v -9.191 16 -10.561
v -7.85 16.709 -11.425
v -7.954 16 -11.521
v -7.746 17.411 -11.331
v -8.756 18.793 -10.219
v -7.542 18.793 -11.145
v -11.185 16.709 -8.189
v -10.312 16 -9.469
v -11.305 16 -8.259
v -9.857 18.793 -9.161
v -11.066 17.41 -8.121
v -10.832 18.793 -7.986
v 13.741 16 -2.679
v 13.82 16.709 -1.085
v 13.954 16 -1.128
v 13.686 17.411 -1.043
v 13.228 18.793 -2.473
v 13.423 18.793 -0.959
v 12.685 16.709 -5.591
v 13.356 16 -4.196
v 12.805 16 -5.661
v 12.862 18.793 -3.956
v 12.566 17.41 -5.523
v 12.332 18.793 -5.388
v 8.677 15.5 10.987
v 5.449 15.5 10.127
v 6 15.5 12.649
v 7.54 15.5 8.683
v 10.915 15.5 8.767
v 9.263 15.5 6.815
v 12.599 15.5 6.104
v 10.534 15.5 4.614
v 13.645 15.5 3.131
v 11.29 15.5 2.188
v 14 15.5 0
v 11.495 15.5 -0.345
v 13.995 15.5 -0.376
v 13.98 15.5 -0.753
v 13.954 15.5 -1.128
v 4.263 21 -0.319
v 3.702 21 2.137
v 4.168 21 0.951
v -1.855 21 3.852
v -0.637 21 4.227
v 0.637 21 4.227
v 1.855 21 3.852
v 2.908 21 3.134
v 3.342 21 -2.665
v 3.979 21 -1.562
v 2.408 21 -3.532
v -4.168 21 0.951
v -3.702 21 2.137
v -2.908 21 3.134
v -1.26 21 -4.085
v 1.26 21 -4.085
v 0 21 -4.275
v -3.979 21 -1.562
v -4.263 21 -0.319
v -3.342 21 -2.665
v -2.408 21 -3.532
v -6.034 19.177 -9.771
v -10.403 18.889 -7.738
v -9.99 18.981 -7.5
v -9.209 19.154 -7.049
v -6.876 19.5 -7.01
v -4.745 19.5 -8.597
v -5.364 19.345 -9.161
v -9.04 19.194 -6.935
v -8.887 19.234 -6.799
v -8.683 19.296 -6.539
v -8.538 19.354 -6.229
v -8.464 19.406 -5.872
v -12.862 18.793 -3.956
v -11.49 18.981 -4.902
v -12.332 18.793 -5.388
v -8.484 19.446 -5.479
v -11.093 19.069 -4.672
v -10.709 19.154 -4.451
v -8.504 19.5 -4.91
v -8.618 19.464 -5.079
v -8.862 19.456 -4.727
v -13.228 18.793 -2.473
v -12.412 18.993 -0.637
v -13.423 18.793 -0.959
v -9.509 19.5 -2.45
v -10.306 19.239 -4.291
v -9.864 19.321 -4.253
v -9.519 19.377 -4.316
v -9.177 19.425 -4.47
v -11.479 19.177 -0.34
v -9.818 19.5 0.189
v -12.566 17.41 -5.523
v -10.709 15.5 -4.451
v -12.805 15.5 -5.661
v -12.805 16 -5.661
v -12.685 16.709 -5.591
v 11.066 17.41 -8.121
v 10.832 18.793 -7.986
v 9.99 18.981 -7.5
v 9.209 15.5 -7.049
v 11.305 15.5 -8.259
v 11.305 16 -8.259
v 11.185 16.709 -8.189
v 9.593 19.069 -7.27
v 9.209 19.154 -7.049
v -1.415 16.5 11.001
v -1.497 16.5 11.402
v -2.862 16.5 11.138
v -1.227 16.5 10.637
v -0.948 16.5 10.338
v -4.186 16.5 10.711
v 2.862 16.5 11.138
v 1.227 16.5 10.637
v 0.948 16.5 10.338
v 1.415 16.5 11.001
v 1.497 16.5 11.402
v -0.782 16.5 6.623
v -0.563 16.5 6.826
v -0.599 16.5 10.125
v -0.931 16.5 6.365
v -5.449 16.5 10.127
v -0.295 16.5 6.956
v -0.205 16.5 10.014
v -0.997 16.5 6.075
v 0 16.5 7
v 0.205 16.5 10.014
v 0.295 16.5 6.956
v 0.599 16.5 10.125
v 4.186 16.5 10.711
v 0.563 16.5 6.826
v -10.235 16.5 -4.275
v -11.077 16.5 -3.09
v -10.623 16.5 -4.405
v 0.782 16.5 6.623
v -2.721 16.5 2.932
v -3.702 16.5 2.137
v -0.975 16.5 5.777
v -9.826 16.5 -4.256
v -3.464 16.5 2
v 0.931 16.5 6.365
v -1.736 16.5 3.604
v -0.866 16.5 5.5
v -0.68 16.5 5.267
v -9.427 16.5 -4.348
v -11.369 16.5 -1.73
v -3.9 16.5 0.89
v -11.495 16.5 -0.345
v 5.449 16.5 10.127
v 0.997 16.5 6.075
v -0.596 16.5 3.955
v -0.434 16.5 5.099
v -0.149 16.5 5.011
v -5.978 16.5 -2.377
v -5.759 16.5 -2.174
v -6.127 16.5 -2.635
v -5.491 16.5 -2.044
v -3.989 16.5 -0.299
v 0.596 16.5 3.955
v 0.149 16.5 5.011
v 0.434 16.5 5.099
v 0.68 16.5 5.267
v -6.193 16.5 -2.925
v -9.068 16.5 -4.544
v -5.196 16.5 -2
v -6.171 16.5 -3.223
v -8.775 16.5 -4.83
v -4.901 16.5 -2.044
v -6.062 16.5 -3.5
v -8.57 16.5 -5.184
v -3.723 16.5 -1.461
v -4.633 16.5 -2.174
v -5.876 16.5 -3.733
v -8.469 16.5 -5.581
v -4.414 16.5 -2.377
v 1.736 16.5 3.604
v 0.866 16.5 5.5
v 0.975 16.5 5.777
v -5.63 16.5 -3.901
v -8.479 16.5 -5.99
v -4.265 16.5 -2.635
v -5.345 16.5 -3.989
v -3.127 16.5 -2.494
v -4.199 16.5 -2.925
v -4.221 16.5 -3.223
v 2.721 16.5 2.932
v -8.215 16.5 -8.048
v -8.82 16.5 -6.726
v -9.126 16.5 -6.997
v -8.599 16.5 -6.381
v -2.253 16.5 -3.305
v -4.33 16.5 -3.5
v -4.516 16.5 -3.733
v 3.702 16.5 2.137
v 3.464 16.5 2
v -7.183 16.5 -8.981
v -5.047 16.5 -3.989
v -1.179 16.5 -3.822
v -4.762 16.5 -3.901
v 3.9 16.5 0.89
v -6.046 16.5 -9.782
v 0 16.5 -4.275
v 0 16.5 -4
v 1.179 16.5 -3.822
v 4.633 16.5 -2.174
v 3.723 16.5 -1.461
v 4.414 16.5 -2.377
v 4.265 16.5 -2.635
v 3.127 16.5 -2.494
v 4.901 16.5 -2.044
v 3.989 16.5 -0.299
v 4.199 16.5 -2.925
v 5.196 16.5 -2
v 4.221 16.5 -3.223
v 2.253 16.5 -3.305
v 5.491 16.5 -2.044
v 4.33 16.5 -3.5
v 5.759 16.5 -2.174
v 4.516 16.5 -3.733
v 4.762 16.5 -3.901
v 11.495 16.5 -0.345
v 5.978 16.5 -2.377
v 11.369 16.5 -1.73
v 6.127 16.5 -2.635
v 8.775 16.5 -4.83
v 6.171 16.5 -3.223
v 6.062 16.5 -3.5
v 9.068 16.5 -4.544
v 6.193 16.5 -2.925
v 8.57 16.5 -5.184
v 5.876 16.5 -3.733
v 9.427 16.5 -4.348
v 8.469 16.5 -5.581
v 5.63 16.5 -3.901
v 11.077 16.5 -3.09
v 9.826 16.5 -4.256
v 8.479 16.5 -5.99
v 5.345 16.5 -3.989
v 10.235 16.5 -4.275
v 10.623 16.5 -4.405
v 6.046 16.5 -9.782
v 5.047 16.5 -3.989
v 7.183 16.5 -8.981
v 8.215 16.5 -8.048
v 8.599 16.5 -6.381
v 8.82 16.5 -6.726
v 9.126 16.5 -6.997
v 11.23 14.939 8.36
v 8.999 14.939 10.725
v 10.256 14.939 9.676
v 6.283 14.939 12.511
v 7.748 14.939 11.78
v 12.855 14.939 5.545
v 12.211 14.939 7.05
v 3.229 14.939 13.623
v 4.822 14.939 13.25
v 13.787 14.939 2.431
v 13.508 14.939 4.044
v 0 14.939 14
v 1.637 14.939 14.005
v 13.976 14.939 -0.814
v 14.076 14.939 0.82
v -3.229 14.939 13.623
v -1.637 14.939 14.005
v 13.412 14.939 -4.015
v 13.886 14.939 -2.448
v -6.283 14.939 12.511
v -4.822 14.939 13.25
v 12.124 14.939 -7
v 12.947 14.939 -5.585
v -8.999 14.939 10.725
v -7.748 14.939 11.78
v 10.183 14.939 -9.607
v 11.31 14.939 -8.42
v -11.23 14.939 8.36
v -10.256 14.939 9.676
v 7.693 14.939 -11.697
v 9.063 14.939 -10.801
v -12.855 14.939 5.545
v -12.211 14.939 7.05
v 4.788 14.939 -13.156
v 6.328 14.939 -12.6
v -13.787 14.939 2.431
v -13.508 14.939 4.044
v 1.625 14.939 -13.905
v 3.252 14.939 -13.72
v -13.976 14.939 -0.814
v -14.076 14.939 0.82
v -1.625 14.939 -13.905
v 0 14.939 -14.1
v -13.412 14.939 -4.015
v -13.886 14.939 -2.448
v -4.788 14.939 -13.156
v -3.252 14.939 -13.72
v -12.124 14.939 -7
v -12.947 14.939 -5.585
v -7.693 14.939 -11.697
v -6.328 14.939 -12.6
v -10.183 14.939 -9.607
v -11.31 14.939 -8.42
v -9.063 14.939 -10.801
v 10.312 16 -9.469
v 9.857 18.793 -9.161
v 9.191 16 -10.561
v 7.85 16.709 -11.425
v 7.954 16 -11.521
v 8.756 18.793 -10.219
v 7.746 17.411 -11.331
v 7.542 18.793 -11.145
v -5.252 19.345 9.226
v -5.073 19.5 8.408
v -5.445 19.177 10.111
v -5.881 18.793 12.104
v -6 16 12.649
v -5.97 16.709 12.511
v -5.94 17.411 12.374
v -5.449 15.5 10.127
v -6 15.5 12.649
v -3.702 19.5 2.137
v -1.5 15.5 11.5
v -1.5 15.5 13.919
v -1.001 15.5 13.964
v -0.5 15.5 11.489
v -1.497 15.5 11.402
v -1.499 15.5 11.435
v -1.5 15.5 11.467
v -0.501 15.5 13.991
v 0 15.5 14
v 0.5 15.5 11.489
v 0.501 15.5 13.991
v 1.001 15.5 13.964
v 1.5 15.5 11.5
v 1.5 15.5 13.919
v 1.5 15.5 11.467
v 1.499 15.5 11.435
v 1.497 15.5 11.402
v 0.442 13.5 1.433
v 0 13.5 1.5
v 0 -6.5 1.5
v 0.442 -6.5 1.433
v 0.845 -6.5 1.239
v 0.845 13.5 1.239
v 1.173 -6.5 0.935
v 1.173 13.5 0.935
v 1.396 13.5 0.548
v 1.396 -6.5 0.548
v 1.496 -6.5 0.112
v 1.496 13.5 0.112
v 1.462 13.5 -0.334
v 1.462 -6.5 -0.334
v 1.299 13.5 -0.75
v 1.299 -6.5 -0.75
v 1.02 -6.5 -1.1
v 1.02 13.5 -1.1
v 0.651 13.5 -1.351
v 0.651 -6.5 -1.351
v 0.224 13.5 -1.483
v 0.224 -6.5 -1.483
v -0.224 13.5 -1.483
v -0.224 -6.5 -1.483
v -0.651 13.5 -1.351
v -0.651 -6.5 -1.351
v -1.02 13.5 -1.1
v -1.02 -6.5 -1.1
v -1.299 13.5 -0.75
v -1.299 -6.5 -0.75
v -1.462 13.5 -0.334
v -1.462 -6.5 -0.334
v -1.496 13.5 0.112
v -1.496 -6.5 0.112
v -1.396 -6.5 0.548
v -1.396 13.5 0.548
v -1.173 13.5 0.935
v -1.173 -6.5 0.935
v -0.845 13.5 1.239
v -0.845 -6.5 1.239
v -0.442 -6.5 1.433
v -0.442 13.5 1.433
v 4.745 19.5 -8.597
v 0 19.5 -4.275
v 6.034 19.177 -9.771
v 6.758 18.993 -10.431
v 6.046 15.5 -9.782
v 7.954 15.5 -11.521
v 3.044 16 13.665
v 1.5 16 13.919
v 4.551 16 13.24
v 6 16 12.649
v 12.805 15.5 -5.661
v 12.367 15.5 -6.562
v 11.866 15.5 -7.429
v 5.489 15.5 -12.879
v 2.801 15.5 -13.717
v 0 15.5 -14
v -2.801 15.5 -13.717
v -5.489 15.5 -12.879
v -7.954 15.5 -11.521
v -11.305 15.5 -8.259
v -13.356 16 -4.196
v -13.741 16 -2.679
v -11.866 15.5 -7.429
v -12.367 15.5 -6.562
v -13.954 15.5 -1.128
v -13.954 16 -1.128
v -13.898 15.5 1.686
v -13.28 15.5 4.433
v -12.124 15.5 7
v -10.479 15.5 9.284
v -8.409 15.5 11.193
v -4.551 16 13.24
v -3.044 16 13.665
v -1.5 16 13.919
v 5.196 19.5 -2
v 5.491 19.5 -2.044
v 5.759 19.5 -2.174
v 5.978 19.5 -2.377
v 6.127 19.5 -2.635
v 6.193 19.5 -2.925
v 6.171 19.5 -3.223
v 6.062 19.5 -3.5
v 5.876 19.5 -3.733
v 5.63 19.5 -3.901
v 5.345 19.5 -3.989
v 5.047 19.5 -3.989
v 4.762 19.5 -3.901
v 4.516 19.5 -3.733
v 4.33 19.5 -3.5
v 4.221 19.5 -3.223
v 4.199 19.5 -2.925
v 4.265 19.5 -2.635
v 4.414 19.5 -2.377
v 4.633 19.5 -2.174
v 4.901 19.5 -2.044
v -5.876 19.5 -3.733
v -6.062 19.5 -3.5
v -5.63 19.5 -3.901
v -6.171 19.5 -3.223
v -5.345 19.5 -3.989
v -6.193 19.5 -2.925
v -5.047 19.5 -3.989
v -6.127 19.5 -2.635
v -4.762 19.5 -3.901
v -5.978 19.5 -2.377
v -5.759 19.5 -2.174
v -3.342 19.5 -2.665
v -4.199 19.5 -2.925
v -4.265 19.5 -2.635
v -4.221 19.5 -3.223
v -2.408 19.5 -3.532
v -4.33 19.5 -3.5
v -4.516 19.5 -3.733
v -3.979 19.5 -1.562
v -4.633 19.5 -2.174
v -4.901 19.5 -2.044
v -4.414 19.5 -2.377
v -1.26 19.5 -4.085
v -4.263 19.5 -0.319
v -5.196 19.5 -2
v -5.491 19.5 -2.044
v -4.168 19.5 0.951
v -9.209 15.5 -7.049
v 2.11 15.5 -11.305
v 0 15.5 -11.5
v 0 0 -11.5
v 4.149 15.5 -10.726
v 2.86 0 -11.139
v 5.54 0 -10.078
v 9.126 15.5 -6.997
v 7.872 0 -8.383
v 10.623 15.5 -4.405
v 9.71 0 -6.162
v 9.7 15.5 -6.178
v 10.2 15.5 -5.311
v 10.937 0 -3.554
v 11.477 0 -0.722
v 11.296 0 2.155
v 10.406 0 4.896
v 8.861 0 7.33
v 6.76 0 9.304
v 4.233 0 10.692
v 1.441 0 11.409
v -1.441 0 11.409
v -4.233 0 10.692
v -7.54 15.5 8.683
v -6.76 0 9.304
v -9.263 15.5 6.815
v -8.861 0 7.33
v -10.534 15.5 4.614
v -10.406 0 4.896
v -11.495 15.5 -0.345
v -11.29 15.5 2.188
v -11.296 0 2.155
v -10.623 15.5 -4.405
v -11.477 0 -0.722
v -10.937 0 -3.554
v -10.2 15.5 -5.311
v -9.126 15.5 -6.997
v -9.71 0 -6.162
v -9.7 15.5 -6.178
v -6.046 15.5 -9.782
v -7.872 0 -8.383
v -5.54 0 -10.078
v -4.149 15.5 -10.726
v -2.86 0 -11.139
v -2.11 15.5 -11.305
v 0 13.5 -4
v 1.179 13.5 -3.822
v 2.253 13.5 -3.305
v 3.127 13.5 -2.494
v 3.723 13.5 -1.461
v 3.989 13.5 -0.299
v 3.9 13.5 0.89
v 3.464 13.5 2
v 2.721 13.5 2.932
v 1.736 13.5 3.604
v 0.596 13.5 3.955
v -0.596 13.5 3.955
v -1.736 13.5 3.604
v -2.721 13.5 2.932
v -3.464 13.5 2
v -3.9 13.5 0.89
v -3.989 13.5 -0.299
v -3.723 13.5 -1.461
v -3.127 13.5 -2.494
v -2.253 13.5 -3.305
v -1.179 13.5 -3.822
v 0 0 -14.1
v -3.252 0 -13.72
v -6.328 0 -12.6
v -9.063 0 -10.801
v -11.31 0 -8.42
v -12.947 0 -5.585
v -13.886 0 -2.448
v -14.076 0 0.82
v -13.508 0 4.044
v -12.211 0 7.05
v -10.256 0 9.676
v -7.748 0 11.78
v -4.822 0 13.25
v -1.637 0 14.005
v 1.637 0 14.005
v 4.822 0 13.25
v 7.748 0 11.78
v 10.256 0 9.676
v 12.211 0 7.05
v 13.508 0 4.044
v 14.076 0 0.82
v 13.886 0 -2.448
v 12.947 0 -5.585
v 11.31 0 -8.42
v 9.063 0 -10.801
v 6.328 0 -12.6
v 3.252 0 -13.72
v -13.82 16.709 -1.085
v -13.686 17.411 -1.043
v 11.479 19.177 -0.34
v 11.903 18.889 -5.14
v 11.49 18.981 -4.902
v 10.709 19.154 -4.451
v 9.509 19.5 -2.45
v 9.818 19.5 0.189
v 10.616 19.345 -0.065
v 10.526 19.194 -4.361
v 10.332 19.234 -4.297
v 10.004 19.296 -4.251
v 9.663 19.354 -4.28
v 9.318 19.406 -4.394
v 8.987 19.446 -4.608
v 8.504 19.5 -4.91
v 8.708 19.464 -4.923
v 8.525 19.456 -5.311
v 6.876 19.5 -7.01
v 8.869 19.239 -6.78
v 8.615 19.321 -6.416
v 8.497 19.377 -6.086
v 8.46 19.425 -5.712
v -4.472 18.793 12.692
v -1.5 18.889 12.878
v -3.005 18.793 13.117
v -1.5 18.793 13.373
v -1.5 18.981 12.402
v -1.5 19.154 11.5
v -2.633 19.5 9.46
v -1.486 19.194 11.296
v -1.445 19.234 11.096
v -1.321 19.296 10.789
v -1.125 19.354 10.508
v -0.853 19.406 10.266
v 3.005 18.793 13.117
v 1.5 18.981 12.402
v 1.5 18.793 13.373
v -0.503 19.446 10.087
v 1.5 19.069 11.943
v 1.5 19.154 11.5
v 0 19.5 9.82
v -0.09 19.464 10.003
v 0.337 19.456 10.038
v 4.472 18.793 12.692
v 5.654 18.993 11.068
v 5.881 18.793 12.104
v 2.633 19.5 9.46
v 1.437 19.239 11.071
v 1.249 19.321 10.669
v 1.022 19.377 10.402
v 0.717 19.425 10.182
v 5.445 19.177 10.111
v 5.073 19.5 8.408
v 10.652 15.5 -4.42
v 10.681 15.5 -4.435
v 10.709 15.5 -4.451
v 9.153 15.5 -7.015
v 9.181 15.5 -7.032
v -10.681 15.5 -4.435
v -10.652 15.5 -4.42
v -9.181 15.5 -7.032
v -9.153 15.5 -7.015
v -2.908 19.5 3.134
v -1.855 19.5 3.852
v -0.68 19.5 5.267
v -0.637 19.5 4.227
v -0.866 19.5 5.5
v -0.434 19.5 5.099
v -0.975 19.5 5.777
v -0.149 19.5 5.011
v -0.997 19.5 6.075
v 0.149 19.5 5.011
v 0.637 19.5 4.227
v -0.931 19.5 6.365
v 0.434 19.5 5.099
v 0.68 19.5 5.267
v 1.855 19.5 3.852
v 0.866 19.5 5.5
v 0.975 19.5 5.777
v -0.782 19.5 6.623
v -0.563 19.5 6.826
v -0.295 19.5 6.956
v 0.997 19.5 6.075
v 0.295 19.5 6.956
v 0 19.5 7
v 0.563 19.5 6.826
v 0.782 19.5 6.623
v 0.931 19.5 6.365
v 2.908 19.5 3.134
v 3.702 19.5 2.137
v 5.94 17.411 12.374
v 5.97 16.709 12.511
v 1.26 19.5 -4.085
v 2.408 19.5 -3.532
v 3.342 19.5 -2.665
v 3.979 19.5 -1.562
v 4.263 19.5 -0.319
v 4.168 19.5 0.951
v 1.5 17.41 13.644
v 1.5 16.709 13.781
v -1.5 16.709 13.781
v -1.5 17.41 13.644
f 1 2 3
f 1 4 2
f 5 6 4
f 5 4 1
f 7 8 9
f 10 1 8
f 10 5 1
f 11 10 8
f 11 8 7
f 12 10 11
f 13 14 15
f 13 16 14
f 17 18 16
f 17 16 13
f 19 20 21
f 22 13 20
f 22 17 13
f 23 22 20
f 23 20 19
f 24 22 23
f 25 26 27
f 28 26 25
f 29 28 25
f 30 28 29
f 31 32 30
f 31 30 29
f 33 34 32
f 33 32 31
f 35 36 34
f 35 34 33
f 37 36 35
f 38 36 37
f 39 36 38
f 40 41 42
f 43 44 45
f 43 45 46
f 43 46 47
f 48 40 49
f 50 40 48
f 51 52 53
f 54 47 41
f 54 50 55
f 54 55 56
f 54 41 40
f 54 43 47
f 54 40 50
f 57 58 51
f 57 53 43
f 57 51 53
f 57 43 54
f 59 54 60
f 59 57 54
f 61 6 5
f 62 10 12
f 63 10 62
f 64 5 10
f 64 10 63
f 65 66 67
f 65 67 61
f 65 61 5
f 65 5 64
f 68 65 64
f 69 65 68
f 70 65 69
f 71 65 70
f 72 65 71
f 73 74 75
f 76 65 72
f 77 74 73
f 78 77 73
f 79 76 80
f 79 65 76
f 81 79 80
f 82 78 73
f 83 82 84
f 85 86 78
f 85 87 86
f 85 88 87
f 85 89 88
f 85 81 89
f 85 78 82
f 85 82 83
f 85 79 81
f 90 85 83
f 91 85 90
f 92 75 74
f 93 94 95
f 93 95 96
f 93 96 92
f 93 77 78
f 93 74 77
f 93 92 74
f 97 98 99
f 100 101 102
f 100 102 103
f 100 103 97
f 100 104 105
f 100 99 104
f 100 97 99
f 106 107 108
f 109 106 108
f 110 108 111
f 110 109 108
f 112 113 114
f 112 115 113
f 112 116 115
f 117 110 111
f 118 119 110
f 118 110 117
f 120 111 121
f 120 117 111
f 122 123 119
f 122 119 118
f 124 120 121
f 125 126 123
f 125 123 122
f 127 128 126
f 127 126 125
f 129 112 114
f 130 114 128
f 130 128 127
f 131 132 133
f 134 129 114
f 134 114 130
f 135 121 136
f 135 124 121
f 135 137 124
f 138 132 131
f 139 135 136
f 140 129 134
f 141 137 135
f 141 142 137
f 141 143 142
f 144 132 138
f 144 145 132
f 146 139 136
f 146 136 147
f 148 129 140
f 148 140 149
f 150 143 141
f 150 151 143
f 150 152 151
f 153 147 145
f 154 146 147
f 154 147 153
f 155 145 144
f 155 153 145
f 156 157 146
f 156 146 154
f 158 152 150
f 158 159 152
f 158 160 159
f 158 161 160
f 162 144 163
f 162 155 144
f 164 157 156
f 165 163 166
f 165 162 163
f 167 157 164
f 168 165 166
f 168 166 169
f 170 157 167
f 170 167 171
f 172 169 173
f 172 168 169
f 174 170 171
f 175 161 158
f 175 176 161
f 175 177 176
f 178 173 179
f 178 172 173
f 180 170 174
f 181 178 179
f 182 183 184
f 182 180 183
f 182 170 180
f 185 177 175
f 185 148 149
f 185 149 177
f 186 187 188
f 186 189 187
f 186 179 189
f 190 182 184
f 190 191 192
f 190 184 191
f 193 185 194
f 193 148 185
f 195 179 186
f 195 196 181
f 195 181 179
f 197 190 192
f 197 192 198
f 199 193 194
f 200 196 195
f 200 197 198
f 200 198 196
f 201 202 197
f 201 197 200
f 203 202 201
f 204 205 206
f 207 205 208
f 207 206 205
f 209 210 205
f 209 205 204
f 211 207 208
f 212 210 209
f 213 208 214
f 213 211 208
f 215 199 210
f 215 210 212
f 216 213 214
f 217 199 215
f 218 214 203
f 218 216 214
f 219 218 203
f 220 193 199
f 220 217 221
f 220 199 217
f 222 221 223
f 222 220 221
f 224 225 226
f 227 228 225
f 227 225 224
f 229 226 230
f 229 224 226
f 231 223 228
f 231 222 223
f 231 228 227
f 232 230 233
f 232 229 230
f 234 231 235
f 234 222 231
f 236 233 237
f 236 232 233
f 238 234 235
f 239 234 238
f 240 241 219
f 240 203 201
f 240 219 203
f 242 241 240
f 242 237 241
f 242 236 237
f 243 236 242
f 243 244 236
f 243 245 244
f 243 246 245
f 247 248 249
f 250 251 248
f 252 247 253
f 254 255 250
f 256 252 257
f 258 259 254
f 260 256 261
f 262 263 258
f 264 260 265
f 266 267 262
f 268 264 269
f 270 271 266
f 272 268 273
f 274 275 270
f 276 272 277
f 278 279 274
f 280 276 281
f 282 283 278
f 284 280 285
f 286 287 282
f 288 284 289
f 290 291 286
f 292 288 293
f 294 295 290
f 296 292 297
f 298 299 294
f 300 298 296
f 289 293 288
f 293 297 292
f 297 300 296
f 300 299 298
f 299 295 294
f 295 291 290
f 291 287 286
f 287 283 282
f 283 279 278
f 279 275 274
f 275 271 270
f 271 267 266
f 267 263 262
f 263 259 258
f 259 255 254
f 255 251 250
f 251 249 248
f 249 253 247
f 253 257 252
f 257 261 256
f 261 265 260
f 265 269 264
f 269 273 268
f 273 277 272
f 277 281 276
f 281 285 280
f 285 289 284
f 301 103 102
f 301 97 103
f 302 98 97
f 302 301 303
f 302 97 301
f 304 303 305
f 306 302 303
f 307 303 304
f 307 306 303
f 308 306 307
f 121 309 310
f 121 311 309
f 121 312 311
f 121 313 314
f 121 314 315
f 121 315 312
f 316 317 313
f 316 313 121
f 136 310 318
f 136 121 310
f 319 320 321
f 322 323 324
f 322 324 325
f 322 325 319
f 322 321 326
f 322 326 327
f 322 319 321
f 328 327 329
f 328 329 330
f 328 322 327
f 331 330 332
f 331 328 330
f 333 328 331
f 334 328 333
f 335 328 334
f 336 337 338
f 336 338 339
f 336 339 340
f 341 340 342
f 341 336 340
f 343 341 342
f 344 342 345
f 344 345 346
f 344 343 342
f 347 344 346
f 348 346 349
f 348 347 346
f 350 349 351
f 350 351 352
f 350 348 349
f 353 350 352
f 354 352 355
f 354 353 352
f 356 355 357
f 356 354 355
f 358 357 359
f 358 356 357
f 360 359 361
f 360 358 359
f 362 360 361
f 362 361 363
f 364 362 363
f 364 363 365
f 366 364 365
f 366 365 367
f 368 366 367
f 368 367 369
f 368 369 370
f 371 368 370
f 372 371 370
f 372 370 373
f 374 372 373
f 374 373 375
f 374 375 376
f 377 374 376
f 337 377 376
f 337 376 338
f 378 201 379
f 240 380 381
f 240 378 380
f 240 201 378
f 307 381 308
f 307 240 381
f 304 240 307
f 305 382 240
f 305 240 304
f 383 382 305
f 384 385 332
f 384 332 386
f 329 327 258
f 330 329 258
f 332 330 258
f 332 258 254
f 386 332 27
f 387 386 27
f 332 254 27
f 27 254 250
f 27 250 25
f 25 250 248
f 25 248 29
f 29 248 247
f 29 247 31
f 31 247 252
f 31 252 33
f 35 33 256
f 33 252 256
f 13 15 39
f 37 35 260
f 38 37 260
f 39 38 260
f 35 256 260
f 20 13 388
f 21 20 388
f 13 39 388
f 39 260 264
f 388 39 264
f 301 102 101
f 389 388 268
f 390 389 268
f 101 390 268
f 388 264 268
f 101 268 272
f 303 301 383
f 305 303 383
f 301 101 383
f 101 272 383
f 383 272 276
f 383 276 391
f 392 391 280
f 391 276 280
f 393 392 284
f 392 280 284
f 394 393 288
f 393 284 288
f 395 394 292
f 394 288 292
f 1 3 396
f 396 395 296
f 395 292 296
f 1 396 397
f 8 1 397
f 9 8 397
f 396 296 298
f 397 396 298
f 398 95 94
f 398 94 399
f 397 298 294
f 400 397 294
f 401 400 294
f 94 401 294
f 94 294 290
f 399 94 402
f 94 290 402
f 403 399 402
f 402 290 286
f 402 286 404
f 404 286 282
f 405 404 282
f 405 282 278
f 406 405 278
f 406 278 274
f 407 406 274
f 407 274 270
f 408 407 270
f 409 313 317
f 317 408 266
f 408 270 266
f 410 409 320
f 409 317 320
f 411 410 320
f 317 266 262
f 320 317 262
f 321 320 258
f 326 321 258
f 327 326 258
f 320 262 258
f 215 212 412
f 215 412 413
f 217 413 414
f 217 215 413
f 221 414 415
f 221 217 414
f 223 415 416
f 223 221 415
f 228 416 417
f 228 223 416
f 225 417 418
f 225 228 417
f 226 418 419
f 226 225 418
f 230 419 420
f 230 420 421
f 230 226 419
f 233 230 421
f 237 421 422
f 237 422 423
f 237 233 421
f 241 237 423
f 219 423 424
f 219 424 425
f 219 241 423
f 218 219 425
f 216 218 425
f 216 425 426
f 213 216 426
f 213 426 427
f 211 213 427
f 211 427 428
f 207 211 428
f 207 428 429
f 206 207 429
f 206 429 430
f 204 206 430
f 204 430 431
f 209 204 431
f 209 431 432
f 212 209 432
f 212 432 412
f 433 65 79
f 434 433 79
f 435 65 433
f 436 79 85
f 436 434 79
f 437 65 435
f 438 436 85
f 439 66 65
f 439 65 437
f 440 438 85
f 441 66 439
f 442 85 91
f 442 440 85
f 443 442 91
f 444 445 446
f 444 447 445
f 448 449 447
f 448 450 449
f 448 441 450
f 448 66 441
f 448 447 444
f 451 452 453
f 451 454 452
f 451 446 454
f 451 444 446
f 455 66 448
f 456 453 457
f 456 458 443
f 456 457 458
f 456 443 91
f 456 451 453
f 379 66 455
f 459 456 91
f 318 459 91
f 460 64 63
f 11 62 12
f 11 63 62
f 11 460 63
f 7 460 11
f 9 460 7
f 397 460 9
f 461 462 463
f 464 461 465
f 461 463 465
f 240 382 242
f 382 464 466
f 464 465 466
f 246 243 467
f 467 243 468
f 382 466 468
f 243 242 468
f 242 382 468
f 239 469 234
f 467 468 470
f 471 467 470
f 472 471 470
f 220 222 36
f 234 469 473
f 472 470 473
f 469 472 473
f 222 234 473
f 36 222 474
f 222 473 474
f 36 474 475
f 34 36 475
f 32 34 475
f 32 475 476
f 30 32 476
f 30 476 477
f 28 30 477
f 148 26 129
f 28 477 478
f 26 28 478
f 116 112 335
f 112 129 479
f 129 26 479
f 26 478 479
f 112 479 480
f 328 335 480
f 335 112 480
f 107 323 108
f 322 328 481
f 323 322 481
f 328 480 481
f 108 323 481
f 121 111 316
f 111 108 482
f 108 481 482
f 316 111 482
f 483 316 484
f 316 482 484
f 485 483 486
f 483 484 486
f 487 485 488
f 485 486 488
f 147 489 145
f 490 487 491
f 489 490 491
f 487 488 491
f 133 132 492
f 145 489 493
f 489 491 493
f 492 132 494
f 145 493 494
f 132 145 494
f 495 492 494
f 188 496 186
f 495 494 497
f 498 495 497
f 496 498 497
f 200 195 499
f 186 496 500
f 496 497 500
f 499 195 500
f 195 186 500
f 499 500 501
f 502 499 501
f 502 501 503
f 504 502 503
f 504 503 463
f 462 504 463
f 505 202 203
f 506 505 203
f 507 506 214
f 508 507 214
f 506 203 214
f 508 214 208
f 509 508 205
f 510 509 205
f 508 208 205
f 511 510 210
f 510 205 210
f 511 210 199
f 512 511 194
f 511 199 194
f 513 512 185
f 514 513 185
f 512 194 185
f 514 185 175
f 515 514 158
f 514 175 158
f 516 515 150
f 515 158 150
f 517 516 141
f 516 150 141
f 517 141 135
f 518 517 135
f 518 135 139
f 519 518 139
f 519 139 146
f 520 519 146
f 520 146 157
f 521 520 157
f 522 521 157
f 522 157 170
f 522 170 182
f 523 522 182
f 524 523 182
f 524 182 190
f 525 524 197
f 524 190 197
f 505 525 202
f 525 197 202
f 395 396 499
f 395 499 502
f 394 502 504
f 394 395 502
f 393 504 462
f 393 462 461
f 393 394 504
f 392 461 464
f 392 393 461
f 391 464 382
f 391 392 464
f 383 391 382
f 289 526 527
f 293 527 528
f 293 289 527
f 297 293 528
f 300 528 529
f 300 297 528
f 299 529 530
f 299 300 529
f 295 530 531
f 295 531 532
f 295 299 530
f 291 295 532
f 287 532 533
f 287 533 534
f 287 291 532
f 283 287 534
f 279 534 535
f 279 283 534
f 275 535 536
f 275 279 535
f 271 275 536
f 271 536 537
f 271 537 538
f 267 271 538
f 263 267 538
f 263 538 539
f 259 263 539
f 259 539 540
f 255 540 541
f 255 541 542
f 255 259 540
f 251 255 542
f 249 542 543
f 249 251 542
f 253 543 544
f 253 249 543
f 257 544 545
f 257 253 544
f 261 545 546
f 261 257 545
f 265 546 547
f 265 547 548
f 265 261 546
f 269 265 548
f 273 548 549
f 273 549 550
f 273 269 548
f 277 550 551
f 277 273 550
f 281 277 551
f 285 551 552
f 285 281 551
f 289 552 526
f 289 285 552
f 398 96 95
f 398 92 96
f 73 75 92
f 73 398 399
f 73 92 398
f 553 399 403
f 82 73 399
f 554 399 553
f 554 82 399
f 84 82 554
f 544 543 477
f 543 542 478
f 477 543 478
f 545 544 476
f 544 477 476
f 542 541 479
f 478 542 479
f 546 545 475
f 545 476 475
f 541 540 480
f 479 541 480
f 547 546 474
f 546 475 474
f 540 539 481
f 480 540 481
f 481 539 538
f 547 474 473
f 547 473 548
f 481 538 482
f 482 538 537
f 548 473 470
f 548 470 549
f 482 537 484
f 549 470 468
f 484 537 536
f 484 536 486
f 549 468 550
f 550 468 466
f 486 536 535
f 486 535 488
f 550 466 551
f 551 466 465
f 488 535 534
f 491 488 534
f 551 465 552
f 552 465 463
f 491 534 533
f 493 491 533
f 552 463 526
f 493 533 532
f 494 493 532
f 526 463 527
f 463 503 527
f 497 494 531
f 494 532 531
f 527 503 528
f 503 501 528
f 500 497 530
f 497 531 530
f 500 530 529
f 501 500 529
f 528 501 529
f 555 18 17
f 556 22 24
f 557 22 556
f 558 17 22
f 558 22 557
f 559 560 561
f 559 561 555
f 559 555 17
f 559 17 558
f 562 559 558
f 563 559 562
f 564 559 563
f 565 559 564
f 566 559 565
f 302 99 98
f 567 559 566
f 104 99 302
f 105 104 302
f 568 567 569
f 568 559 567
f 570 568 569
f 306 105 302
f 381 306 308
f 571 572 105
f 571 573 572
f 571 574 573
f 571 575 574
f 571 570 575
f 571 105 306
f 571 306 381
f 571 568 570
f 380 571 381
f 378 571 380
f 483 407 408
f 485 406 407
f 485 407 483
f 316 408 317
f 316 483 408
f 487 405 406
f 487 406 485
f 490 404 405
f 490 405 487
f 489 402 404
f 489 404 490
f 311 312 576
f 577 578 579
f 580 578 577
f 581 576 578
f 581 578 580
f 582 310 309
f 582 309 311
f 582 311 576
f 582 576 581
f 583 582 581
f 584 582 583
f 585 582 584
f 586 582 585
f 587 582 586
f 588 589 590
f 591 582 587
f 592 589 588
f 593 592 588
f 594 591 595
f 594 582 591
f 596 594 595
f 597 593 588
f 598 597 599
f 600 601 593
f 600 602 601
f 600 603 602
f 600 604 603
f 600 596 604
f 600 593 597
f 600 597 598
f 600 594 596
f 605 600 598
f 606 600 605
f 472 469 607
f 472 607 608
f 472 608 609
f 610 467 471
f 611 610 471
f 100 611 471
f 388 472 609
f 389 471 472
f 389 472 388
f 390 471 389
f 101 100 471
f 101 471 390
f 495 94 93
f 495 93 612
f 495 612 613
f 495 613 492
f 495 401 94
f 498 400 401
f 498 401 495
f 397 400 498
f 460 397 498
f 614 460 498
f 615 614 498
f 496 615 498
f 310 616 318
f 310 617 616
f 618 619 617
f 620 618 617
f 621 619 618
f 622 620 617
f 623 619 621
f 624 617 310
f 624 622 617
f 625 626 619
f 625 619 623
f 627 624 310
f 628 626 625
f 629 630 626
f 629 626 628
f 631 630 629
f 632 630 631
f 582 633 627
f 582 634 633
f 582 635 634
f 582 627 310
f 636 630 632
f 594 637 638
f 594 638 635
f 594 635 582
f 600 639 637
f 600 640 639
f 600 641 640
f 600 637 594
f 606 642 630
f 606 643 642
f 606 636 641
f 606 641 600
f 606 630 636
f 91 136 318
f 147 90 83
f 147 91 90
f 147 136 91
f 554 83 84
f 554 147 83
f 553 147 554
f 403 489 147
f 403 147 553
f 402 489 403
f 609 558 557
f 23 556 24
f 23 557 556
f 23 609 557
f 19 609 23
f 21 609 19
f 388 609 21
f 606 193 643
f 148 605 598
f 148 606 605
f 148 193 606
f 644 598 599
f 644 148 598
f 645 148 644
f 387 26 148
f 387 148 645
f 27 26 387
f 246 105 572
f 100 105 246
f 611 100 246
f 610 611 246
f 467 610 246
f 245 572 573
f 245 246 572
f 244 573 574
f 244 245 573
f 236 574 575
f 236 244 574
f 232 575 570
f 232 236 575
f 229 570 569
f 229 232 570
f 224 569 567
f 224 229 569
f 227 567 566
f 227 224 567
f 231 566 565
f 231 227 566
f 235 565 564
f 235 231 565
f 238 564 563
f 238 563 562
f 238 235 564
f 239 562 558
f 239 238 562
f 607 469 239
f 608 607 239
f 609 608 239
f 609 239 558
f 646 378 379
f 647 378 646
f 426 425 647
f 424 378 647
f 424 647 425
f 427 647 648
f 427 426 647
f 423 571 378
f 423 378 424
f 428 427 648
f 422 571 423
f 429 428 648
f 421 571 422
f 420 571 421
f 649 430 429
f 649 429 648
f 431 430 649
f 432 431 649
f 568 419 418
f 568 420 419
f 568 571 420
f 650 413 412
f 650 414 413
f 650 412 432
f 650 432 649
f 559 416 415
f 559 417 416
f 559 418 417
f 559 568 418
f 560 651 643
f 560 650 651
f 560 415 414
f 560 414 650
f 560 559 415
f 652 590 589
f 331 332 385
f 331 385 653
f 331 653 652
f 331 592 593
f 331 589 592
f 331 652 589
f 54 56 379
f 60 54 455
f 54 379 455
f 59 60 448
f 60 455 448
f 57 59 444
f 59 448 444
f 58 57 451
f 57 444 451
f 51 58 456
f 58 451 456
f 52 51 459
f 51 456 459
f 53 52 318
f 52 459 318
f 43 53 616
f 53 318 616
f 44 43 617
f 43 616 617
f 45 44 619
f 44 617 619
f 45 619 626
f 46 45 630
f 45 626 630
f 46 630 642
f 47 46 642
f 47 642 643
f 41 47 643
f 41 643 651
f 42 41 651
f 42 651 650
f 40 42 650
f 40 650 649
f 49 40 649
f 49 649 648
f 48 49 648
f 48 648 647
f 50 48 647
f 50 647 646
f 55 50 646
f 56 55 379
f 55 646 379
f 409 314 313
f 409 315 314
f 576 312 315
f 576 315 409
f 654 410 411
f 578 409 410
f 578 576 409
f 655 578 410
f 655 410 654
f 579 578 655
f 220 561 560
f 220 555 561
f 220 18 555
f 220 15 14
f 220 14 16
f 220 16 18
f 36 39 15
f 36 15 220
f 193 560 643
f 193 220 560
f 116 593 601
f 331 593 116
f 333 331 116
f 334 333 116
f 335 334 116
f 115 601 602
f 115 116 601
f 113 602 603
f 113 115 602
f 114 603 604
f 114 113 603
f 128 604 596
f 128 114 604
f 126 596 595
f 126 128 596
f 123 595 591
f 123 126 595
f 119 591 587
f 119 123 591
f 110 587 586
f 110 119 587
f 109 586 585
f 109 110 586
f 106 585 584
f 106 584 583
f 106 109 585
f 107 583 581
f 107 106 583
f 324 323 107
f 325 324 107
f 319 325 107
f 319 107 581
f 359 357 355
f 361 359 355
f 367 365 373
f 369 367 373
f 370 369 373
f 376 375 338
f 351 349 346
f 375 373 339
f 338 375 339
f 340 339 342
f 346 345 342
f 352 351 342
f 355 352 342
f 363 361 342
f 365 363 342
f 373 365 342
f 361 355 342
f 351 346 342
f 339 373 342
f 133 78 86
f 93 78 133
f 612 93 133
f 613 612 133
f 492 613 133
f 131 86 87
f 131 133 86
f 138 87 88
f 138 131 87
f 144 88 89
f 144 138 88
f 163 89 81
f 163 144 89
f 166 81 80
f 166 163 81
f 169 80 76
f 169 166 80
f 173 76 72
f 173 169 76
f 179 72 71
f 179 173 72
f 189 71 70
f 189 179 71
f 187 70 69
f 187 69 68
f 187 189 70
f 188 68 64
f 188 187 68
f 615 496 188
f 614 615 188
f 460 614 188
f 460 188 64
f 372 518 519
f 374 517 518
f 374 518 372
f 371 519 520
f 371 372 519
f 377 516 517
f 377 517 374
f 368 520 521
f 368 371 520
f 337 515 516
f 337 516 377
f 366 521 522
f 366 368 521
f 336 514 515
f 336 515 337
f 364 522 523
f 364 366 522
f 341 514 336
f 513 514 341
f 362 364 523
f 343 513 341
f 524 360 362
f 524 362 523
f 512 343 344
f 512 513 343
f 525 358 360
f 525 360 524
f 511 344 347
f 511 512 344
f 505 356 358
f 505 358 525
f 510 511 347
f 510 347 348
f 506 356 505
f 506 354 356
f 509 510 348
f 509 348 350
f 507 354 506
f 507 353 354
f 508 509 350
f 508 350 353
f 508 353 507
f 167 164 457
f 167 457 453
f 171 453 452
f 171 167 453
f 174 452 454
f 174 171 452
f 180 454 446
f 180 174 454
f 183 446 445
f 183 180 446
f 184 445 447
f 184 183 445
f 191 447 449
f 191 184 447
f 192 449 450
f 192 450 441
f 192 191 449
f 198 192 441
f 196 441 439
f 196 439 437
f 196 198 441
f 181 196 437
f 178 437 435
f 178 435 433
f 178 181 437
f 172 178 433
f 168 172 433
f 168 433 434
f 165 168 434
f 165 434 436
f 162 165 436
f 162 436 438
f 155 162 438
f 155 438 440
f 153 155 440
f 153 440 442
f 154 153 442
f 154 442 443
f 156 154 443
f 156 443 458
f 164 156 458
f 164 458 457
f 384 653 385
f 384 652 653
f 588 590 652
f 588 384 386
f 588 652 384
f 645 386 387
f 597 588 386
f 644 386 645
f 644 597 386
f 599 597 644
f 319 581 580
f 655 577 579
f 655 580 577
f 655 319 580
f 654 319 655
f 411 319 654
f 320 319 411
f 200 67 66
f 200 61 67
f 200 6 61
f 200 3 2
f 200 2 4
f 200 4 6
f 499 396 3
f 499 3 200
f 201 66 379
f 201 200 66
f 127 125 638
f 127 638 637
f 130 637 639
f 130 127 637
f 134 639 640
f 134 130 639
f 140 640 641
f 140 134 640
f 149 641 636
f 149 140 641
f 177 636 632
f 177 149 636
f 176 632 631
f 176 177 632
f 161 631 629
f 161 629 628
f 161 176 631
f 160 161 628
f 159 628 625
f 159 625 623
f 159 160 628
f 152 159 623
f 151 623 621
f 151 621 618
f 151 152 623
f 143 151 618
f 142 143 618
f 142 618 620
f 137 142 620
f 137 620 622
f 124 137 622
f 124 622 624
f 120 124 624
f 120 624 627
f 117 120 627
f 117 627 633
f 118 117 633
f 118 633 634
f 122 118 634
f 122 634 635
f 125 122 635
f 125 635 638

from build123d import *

# Parameters (mm, degrees)
SCHIZZO1_R                   = 14
ESTRUSIONE_ESTRUSIONE1_DEPTH = 19.5
TAGLIO_ESTRUSIONE1_START     = -4
SCHIZZO2_R                   = 1
TAGLIO_ESTRUSIONE1_DEPTH     = 4
SCHIZZO3_R                   = 4.27486225
ESTRUSIONE_ESTRUSIONE2_DEPTH = 1.5
SCHIZZO4_R                   = 11.5
TAGLIO_ESTRUSIONE2_DEPTH     = 16.5
SCHIZZO5_R                   = 1.5
TAGLIO_ESTRUSIONE3_DEPTH     = 16.5
TAGLIO_ESTRUSIONE4_START     = -4
TAGLIO_ESTRUSIONE4_DEPTH     = 4
SCHIZZO7_R                   = 1.5
ESTRUSIONE_ESTRUSIONE3_DEPTH = 27.5
SCHIZZO8_R                   = 4
ESTRUSIONE_ESTRUSIONE4_DEPTH = 3
SCHIZZO9_W                   = 0.1
SCHIZZO9_H                   = 14.938811625
SMUSSO1_SIZE                 = 3.5
SMUSSO1_SIZE2                = 0.680331082
SMUSSO2_SIZE                 = 0.720279458
SMUSSO2_SIZE_2               = 3.5


with BuildPart() as part:
    # Schizzo1 → Estrusione-Estrusione1 (new body)
    with BuildSketch(Plane(origin=(0, 0, 0), x_dir=(1, 0, 0), z_dir=(0, 1, 0))):
        with Locations(Location((0, 0, 0), (0, 0, 270))):
            Circle(SCHIZZO1_R)
    extrude(amount=ESTRUSIONE_ESTRUSIONE1_DEPTH)

    # Schizzo2 → Taglio-Estrusione1 (cut)
    with BuildSketch(Plane(origin=(0, 19.5, 0), x_dir=(1, 0, 0), z_dir=(0, 1, 0)).offset(TAGLIO_ESTRUSIONE1_START)):
        with BuildLine():
            Line((-7.95445115, 11.520707743), (0, 4.27486225))
            Line((0, 4.27486225), (7.95445115, 11.520707743))
            ThreePointArc((7.95445115, 11.520707743), (0, 14), (-7.95445115, 11.520707743))
        make_face()
        with BuildLine():
            ThreePointArc((14, 0), (13.988608153, 0.564660915), (13.95445115, 1.128402898))
            Line((13.95445115, 1.128402898), (3.702139306, -2.137431125))
            Line((3.702139306, -2.137431125), (6, -12.649110641))
            ThreePointArc((6, -12.649110641), (11.832159566, -7.483314774), (14, 0))
        make_face()
        with BuildLine():
            Line((-3.702139306, -2.137431125), (-13.95445115, 1.128402898))
            ThreePointArc((-13.95445115, 1.128402898), (-12.124355653, -7), (-6, -12.649110641))
            Line((-6, -12.649110641), (-3.702139306, -2.137431125))
        make_face()
        with Locations(Location((0, -6, 0), (0, 0, 270))):
            Circle(SCHIZZO2_R)
        with Locations(Location((-5.196152423, 3, 0), (0, 0, 270))):
            Circle(SCHIZZO2_R)
        with Locations(Location((5.196152423, 3, 0), (0, 0, 270))):
            Circle(SCHIZZO2_R)
    extrude(amount=TAGLIO_ESTRUSIONE1_DEPTH, mode=Mode.SUBTRACT)

    # Schizzo3 → Estrusione-Estrusione2 (add)
    with BuildSketch(Plane(origin=(0, 19.5, 0), x_dir=(1, 0, 0), z_dir=(0, 1, 0))):
        with Locations(Location((0, 0, 0), (0, 0, 90))):
            Circle(SCHIZZO3_R)
    extrude(amount=ESTRUSIONE_ESTRUSIONE2_DEPTH)

    # Schizzo4 → Taglio-Estrusione2 (cut)
    with BuildSketch(Plane.XZ):
        with Locations(Location((0, 0, 0), (0, 0, 270))):
            Circle(SCHIZZO4_R)
    extrude(amount=-TAGLIO_ESTRUSIONE2_DEPTH, mode=Mode.SUBTRACT)

    # Schizzo5 → Taglio-Estrusione3 (cut)
    with BuildSketch(Plane(origin=(0, 21, 0), x_dir=(1, 0, 0), z_dir=(0, 1, 0))):
        with Locations(Location((0, 0, 0), (0, 0, 270))):
            Circle(SCHIZZO5_R)
    extrude(amount=-TAGLIO_ESTRUSIONE3_DEPTH, mode=Mode.SUBTRACT)

    # Schizzo6 → Taglio-Estrusione4 (cut)
    with BuildSketch(Plane(origin=(0, 19.5, 0), x_dir=(1, 0, 0), z_dir=(0, 1, 0)).offset(TAGLIO_ESTRUSIONE4_START)):
        with BuildLine():
            Line((1.5, -13.919410907), (1.5, -11.5))
            ThreePointArc((1.5, -11.5), (0, -10), (-1.5, -11.5))
            Line((-1.5, -11.5), (-1.5, -13.919410907))
            ThreePointArc((-1.5, -13.919410907), (0, -14), (1.5, -13.919410907))
        make_face()
        with BuildLine():
            ThreePointArc((9.209292144, 7.049038106), (8.660254038, 5), (10.709292144, 4.450961894))
            Line((10.709292144, 4.450961894), (12.804563451, 5.660667348))
            ThreePointArc((12.804563451, 5.660667348), (12.124355653, 7), (11.304563451, 8.258743559))
            Line((11.304563451, 8.258743559), (9.209292144, 7.049038106))
        make_face()
        with BuildLine():
            ThreePointArc((-10.709292144, 4.450961894), (-8.660254038, 5), (-9.209292144, 7.049038106))
            Line((-9.209292144, 7.049038106), (-11.304563451, 8.258743559))
            ThreePointArc((-11.304563451, 8.258743559), (-12.124355653, 7), (-12.804563451, 5.660667348))
            Line((-12.804563451, 5.660667348), (-10.709292144, 4.450961894))
        make_face()
    extrude(amount=TAGLIO_ESTRUSIONE4_DEPTH, mode=Mode.SUBTRACT)

    # Schizzo7 → Estrusione-Estrusione3 (add)
    with BuildSketch(Plane(origin=(0, 21, 0), x_dir=(1, 0, 0), z_dir=(0, 1, 0))):
        with Locations(Location((0, 0, 0), (0, 0, 270))):
            Circle(SCHIZZO7_R)
    extrude(amount=-ESTRUSIONE_ESTRUSIONE3_DEPTH)

    # Schizzo8 → Estrusione-Estrusione4 (add)
    with BuildSketch(Plane.XZ.offset(-16.5)):
        with Locations(Location((0, 0, 0), (0, 0, 270))):
            Circle(SCHIZZO8_R)
    extrude(amount=ESTRUSIONE_ESTRUSIONE4_DEPTH)

    # Schizzo9 → Rivoluzione1 (revolve)
    with BuildSketch(Plane.XY, mode=Mode.PRIVATE) as rivoluzione1_sk:
        with Locations((-14.05, 7.469405813)):
            Rectangle(SCHIZZO9_W, SCHIZZO9_H)
    revolve(rivoluzione1_sk.sketch.rotate(Axis((0, -6.5, 0), (0, 1, 0)), 270), axis=Axis((0, -6.5, 0), (0, 1, 0)))

    # Smusso1
    smusso1_edges = [part.edges().sort_by_distance(p)[0] for p in [
        (9.766653134, 19.5, -10.030577579),
        (-13.570061565, 19.5, -3.442880935),
        (13.570061565, 19.5, -3.442880935),
        (-3.803408431, 19.5, 13.473458513),
        (-9.766653134, 19.5, -10.030577579),
        (3.803408431, 19.5, 13.473458513),
    ]]
    smusso1_side = [part.faces().sort_by_distance(p)[0] for p in [
        (0, 17.219405813, -14),
    ]]
    chamfer(smusso1_edges, length=SMUSSO1_SIZE, length2=SMUSSO1_SIZE2, reference=smusso1_side[0])

    # Smusso2
    # the kernel refuses this chamfer: 3.5, 0.720279458 mm, written as the material it takes off along each edge
    with BuildSketch(Plane(origin=(0, 19.5, 0), x_dir=(-0.4593857913267627, 0, -0.8882368460760249), z_dir=(0.8882368460760249, 0, -0.4593857913267627))) as smusso2_piece_1:
        Polygon((13.319668918 + SMUSSO2_SIZE * 0.190808995258, -SMUSSO2_SIZE * 0.981627182836), (13.319668918 - SMUSSO2_SIZE_2, 0), (13.319668918, 0), align=None)
    revolve(axis=Axis((0, 19.5, 0), (0, 1, 0)), revolution_arc=97.827137871, mode=Mode.SUBTRACT)
    with BuildSketch(Plane(origin=(0, 19.5, 0), x_dir=(-0.5395427776158211, 0, 0.8419581884646081), z_dir=(-0.8419581884646081, 0, -0.5395427776158211))) as smusso2_piece_2:
        Polygon((13.319668918 + SMUSSO2_SIZE * 0.190808995258, -SMUSSO2_SIZE * 0.981627182836), (13.319668918 - SMUSSO2_SIZE_2, 0), (13.319668918, 0), align=None)
    revolve(axis=Axis((0, 19.5, 0), (0, 1, 0)), revolution_arc=97.827137871, mode=Mode.SUBTRACT)
    with BuildSketch(Plane(origin=(0, 19.5, 0), x_dir=(0.8174001702166583, 0, 0.5760702749923641), z_dir=(-0.5760702749923641, 0, 0.8174001702166583))) as smusso2_piece_3:
        Polygon((13.319668918 + SMUSSO2_SIZE * 0.190808995258, -SMUSSO2_SIZE * 0.981627182836), (13.319668918 - SMUSSO2_SIZE_2, 0), (13.319668918, 0), align=None)
    revolve(axis=Axis((0, 19.5, 0), (0, 1, 0)), revolution_arc=97.827137871, mode=Mode.SUBTRACT)


solid = part.part
